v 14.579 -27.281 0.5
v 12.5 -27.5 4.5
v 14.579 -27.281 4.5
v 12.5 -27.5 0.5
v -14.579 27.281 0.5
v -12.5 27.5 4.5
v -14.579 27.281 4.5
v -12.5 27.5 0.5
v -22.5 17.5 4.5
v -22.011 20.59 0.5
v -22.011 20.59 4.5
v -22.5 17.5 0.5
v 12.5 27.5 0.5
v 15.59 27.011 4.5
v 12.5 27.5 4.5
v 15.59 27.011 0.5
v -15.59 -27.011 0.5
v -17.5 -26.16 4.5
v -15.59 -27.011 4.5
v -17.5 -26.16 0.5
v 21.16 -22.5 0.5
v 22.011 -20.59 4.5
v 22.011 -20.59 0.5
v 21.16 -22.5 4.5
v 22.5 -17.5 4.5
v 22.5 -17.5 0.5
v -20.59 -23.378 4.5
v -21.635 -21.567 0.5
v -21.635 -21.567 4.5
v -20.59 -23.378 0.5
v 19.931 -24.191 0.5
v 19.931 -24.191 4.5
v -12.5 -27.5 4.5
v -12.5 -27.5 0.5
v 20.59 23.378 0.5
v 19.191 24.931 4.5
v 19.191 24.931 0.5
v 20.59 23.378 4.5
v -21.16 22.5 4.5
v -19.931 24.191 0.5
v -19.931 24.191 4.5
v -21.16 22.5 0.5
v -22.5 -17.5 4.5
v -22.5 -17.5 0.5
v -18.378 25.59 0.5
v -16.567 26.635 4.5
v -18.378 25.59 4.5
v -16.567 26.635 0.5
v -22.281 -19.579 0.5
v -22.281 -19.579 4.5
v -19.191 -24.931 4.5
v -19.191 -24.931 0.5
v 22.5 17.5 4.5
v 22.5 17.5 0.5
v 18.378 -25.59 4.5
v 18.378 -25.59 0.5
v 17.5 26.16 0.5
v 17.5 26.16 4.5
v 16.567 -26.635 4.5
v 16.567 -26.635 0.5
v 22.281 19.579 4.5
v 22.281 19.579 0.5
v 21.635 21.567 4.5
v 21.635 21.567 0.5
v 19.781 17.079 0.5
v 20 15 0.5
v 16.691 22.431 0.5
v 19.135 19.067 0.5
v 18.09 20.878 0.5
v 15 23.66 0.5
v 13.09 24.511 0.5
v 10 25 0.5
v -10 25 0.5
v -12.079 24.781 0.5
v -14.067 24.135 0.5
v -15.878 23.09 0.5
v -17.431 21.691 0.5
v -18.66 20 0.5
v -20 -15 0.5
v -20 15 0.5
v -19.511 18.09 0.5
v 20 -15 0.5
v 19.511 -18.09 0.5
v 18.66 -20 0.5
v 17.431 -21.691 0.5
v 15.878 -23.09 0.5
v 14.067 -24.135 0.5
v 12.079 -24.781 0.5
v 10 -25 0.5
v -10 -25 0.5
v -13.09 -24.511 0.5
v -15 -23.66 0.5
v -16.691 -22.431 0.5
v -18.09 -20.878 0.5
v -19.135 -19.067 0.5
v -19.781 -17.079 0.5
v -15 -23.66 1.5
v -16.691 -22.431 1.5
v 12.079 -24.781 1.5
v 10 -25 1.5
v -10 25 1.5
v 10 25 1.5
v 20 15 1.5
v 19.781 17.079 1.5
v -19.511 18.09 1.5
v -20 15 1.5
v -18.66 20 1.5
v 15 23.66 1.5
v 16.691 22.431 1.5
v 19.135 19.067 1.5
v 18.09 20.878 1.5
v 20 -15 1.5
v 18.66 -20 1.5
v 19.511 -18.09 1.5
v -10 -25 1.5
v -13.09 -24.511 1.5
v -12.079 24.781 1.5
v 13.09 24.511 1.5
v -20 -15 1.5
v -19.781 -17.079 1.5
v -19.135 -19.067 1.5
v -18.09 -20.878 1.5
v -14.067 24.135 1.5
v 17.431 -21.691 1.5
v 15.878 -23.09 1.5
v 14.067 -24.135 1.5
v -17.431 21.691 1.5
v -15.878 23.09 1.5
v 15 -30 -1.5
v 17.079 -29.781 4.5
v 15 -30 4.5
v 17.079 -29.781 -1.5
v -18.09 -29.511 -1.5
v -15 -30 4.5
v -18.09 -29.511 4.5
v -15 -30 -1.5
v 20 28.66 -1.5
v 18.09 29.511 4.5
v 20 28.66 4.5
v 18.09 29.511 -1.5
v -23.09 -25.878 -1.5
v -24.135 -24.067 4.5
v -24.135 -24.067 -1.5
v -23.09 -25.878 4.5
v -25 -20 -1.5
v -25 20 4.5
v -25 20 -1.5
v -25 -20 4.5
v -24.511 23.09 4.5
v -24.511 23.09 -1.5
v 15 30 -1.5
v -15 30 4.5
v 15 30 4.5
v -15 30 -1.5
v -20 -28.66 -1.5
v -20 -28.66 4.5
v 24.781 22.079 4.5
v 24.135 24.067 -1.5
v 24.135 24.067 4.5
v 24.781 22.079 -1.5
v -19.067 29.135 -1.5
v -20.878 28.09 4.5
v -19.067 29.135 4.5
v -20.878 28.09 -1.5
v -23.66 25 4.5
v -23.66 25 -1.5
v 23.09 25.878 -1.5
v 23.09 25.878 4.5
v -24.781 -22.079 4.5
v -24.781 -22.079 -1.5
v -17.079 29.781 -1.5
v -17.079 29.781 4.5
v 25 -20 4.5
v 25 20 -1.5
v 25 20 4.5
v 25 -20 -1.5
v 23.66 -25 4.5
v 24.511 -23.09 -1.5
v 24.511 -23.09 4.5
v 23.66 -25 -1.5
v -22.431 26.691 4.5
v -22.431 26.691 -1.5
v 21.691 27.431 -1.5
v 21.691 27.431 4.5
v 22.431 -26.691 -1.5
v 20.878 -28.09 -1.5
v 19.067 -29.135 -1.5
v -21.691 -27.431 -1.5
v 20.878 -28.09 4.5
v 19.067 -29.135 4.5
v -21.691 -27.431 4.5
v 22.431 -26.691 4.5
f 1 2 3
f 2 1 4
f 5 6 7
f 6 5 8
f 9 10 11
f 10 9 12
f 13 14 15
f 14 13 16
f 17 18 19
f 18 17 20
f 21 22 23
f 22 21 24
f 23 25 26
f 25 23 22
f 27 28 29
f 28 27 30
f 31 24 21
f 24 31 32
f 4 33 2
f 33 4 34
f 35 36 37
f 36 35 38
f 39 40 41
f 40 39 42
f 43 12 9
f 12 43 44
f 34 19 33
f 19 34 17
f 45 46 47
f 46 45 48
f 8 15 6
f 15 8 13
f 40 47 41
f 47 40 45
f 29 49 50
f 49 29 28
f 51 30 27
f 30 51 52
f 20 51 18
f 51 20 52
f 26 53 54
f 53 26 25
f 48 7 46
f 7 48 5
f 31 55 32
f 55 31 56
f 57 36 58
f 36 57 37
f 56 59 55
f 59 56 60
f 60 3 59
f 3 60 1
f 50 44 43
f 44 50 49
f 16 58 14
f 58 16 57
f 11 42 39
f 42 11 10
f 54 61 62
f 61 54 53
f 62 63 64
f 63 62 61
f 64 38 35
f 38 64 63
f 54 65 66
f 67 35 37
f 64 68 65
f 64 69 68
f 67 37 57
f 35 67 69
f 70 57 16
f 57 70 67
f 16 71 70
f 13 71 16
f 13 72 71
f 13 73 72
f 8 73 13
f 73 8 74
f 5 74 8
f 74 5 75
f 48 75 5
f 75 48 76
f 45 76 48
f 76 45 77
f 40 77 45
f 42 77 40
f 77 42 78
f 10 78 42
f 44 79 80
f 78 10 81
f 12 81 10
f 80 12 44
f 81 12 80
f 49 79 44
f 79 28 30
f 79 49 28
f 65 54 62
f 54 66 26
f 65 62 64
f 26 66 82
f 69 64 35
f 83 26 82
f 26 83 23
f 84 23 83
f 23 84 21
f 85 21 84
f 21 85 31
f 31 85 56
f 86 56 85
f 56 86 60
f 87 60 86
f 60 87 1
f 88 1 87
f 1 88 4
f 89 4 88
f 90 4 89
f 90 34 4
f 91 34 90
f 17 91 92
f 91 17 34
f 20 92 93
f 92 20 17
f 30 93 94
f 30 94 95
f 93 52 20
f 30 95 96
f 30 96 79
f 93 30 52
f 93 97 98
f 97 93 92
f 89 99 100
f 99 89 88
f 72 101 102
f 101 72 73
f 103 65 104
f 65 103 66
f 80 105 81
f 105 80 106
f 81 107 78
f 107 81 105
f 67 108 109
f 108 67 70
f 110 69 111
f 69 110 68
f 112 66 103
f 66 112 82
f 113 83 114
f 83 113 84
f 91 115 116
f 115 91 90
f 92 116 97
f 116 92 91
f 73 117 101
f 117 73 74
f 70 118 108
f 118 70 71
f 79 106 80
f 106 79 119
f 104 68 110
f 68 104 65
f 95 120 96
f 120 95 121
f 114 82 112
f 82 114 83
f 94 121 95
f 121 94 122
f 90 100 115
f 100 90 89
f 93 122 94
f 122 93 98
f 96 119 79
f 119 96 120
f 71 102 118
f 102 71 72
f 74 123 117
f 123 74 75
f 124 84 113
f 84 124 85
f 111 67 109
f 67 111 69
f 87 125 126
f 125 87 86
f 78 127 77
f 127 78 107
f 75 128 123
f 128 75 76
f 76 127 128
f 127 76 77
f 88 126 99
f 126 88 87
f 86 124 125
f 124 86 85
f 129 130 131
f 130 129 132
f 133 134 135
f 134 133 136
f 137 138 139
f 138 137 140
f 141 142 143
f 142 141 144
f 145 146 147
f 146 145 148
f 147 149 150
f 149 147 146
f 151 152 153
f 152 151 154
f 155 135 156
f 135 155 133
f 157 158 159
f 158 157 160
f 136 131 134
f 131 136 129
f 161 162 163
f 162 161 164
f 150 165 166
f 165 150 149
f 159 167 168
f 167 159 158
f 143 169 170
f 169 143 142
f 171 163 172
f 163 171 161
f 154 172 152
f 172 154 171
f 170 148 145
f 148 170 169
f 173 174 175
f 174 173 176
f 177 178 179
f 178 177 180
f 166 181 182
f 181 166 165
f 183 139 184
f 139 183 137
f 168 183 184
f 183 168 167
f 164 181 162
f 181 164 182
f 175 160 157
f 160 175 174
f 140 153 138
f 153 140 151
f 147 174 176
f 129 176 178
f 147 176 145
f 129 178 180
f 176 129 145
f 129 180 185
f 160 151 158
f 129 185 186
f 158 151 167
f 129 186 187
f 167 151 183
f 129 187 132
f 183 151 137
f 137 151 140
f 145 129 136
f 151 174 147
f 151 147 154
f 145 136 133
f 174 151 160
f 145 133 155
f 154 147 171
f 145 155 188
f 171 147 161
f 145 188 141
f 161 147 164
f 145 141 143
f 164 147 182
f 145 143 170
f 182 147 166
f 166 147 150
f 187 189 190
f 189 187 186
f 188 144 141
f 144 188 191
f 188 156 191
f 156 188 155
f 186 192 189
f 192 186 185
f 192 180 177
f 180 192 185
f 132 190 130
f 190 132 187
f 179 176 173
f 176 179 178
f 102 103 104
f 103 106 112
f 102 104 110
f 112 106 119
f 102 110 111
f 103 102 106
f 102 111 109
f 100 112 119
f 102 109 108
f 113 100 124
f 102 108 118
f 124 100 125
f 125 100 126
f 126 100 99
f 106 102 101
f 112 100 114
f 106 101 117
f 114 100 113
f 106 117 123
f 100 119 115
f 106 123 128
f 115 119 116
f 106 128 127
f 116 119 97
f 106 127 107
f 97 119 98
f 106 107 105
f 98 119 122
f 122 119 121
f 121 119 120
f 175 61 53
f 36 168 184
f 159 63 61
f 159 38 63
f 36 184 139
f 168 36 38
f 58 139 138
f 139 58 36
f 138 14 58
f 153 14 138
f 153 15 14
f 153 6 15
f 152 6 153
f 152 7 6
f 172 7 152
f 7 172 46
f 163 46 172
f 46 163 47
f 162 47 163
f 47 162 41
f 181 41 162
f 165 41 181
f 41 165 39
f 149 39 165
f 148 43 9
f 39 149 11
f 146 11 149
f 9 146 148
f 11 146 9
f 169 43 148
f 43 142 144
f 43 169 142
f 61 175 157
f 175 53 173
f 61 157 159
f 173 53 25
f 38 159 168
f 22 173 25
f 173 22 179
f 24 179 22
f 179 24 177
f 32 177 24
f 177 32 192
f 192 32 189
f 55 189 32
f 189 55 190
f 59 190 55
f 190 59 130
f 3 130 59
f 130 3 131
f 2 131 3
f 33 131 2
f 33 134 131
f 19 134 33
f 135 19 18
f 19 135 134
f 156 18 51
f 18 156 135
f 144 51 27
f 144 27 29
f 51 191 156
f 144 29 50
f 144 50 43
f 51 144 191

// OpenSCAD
/*
 * Test for a stamp mold
 */
echo(version=version());

logo = "./images/shark.png"; 
imgRatio = 1.5;
logox = 218 * imgRatio; 
logoy = 231 * imgRatio; 

module roundedRect(size, radius) {  
	linear_extrude(height=size.z, center=true) {
		offset(radius) offset(-radius) {
			square([size.x, size.y], center = true);
		}
	}
}

// Base plate
// ----------
plateWidth = 50;
plateLength = 60;
plateThickNess = 3;
cornerRadius = 10;

difference() {  
	union() {
		difference() {
			roundedRect([plateWidth, plateLength, plateThickNess], cornerRadius);
			translate([0, 0, 2]) {
				scale([.9 * plateWidth / logox, .9 * plateWidth / logoy, .02]) {
					color("white") {
						rotate([0, 0, -90]) {
							surface(file=logo, invert=true, center=true);
						}
					}
				}
        // the groove around the picture
        difference() {
          roundedRect([plateWidth -  5, plateLength -  5, plateThickNess], cornerRadius);
          roundedRect([plateWidth - 10, plateLength - 10, plateThickNess * 1.1], cornerRadius);
        }
			}
		}
		// The frame
		translate([0, 0, (plateThickNess / 1)]) {
			difference() {
				roundedRect([plateWidth, plateLength, plateThickNess], cornerRadius);
				roundedRect([plateWidth - 5, plateLength - 5, plateThickNess * 1.1], cornerRadius);
			}
		}
	}
}
